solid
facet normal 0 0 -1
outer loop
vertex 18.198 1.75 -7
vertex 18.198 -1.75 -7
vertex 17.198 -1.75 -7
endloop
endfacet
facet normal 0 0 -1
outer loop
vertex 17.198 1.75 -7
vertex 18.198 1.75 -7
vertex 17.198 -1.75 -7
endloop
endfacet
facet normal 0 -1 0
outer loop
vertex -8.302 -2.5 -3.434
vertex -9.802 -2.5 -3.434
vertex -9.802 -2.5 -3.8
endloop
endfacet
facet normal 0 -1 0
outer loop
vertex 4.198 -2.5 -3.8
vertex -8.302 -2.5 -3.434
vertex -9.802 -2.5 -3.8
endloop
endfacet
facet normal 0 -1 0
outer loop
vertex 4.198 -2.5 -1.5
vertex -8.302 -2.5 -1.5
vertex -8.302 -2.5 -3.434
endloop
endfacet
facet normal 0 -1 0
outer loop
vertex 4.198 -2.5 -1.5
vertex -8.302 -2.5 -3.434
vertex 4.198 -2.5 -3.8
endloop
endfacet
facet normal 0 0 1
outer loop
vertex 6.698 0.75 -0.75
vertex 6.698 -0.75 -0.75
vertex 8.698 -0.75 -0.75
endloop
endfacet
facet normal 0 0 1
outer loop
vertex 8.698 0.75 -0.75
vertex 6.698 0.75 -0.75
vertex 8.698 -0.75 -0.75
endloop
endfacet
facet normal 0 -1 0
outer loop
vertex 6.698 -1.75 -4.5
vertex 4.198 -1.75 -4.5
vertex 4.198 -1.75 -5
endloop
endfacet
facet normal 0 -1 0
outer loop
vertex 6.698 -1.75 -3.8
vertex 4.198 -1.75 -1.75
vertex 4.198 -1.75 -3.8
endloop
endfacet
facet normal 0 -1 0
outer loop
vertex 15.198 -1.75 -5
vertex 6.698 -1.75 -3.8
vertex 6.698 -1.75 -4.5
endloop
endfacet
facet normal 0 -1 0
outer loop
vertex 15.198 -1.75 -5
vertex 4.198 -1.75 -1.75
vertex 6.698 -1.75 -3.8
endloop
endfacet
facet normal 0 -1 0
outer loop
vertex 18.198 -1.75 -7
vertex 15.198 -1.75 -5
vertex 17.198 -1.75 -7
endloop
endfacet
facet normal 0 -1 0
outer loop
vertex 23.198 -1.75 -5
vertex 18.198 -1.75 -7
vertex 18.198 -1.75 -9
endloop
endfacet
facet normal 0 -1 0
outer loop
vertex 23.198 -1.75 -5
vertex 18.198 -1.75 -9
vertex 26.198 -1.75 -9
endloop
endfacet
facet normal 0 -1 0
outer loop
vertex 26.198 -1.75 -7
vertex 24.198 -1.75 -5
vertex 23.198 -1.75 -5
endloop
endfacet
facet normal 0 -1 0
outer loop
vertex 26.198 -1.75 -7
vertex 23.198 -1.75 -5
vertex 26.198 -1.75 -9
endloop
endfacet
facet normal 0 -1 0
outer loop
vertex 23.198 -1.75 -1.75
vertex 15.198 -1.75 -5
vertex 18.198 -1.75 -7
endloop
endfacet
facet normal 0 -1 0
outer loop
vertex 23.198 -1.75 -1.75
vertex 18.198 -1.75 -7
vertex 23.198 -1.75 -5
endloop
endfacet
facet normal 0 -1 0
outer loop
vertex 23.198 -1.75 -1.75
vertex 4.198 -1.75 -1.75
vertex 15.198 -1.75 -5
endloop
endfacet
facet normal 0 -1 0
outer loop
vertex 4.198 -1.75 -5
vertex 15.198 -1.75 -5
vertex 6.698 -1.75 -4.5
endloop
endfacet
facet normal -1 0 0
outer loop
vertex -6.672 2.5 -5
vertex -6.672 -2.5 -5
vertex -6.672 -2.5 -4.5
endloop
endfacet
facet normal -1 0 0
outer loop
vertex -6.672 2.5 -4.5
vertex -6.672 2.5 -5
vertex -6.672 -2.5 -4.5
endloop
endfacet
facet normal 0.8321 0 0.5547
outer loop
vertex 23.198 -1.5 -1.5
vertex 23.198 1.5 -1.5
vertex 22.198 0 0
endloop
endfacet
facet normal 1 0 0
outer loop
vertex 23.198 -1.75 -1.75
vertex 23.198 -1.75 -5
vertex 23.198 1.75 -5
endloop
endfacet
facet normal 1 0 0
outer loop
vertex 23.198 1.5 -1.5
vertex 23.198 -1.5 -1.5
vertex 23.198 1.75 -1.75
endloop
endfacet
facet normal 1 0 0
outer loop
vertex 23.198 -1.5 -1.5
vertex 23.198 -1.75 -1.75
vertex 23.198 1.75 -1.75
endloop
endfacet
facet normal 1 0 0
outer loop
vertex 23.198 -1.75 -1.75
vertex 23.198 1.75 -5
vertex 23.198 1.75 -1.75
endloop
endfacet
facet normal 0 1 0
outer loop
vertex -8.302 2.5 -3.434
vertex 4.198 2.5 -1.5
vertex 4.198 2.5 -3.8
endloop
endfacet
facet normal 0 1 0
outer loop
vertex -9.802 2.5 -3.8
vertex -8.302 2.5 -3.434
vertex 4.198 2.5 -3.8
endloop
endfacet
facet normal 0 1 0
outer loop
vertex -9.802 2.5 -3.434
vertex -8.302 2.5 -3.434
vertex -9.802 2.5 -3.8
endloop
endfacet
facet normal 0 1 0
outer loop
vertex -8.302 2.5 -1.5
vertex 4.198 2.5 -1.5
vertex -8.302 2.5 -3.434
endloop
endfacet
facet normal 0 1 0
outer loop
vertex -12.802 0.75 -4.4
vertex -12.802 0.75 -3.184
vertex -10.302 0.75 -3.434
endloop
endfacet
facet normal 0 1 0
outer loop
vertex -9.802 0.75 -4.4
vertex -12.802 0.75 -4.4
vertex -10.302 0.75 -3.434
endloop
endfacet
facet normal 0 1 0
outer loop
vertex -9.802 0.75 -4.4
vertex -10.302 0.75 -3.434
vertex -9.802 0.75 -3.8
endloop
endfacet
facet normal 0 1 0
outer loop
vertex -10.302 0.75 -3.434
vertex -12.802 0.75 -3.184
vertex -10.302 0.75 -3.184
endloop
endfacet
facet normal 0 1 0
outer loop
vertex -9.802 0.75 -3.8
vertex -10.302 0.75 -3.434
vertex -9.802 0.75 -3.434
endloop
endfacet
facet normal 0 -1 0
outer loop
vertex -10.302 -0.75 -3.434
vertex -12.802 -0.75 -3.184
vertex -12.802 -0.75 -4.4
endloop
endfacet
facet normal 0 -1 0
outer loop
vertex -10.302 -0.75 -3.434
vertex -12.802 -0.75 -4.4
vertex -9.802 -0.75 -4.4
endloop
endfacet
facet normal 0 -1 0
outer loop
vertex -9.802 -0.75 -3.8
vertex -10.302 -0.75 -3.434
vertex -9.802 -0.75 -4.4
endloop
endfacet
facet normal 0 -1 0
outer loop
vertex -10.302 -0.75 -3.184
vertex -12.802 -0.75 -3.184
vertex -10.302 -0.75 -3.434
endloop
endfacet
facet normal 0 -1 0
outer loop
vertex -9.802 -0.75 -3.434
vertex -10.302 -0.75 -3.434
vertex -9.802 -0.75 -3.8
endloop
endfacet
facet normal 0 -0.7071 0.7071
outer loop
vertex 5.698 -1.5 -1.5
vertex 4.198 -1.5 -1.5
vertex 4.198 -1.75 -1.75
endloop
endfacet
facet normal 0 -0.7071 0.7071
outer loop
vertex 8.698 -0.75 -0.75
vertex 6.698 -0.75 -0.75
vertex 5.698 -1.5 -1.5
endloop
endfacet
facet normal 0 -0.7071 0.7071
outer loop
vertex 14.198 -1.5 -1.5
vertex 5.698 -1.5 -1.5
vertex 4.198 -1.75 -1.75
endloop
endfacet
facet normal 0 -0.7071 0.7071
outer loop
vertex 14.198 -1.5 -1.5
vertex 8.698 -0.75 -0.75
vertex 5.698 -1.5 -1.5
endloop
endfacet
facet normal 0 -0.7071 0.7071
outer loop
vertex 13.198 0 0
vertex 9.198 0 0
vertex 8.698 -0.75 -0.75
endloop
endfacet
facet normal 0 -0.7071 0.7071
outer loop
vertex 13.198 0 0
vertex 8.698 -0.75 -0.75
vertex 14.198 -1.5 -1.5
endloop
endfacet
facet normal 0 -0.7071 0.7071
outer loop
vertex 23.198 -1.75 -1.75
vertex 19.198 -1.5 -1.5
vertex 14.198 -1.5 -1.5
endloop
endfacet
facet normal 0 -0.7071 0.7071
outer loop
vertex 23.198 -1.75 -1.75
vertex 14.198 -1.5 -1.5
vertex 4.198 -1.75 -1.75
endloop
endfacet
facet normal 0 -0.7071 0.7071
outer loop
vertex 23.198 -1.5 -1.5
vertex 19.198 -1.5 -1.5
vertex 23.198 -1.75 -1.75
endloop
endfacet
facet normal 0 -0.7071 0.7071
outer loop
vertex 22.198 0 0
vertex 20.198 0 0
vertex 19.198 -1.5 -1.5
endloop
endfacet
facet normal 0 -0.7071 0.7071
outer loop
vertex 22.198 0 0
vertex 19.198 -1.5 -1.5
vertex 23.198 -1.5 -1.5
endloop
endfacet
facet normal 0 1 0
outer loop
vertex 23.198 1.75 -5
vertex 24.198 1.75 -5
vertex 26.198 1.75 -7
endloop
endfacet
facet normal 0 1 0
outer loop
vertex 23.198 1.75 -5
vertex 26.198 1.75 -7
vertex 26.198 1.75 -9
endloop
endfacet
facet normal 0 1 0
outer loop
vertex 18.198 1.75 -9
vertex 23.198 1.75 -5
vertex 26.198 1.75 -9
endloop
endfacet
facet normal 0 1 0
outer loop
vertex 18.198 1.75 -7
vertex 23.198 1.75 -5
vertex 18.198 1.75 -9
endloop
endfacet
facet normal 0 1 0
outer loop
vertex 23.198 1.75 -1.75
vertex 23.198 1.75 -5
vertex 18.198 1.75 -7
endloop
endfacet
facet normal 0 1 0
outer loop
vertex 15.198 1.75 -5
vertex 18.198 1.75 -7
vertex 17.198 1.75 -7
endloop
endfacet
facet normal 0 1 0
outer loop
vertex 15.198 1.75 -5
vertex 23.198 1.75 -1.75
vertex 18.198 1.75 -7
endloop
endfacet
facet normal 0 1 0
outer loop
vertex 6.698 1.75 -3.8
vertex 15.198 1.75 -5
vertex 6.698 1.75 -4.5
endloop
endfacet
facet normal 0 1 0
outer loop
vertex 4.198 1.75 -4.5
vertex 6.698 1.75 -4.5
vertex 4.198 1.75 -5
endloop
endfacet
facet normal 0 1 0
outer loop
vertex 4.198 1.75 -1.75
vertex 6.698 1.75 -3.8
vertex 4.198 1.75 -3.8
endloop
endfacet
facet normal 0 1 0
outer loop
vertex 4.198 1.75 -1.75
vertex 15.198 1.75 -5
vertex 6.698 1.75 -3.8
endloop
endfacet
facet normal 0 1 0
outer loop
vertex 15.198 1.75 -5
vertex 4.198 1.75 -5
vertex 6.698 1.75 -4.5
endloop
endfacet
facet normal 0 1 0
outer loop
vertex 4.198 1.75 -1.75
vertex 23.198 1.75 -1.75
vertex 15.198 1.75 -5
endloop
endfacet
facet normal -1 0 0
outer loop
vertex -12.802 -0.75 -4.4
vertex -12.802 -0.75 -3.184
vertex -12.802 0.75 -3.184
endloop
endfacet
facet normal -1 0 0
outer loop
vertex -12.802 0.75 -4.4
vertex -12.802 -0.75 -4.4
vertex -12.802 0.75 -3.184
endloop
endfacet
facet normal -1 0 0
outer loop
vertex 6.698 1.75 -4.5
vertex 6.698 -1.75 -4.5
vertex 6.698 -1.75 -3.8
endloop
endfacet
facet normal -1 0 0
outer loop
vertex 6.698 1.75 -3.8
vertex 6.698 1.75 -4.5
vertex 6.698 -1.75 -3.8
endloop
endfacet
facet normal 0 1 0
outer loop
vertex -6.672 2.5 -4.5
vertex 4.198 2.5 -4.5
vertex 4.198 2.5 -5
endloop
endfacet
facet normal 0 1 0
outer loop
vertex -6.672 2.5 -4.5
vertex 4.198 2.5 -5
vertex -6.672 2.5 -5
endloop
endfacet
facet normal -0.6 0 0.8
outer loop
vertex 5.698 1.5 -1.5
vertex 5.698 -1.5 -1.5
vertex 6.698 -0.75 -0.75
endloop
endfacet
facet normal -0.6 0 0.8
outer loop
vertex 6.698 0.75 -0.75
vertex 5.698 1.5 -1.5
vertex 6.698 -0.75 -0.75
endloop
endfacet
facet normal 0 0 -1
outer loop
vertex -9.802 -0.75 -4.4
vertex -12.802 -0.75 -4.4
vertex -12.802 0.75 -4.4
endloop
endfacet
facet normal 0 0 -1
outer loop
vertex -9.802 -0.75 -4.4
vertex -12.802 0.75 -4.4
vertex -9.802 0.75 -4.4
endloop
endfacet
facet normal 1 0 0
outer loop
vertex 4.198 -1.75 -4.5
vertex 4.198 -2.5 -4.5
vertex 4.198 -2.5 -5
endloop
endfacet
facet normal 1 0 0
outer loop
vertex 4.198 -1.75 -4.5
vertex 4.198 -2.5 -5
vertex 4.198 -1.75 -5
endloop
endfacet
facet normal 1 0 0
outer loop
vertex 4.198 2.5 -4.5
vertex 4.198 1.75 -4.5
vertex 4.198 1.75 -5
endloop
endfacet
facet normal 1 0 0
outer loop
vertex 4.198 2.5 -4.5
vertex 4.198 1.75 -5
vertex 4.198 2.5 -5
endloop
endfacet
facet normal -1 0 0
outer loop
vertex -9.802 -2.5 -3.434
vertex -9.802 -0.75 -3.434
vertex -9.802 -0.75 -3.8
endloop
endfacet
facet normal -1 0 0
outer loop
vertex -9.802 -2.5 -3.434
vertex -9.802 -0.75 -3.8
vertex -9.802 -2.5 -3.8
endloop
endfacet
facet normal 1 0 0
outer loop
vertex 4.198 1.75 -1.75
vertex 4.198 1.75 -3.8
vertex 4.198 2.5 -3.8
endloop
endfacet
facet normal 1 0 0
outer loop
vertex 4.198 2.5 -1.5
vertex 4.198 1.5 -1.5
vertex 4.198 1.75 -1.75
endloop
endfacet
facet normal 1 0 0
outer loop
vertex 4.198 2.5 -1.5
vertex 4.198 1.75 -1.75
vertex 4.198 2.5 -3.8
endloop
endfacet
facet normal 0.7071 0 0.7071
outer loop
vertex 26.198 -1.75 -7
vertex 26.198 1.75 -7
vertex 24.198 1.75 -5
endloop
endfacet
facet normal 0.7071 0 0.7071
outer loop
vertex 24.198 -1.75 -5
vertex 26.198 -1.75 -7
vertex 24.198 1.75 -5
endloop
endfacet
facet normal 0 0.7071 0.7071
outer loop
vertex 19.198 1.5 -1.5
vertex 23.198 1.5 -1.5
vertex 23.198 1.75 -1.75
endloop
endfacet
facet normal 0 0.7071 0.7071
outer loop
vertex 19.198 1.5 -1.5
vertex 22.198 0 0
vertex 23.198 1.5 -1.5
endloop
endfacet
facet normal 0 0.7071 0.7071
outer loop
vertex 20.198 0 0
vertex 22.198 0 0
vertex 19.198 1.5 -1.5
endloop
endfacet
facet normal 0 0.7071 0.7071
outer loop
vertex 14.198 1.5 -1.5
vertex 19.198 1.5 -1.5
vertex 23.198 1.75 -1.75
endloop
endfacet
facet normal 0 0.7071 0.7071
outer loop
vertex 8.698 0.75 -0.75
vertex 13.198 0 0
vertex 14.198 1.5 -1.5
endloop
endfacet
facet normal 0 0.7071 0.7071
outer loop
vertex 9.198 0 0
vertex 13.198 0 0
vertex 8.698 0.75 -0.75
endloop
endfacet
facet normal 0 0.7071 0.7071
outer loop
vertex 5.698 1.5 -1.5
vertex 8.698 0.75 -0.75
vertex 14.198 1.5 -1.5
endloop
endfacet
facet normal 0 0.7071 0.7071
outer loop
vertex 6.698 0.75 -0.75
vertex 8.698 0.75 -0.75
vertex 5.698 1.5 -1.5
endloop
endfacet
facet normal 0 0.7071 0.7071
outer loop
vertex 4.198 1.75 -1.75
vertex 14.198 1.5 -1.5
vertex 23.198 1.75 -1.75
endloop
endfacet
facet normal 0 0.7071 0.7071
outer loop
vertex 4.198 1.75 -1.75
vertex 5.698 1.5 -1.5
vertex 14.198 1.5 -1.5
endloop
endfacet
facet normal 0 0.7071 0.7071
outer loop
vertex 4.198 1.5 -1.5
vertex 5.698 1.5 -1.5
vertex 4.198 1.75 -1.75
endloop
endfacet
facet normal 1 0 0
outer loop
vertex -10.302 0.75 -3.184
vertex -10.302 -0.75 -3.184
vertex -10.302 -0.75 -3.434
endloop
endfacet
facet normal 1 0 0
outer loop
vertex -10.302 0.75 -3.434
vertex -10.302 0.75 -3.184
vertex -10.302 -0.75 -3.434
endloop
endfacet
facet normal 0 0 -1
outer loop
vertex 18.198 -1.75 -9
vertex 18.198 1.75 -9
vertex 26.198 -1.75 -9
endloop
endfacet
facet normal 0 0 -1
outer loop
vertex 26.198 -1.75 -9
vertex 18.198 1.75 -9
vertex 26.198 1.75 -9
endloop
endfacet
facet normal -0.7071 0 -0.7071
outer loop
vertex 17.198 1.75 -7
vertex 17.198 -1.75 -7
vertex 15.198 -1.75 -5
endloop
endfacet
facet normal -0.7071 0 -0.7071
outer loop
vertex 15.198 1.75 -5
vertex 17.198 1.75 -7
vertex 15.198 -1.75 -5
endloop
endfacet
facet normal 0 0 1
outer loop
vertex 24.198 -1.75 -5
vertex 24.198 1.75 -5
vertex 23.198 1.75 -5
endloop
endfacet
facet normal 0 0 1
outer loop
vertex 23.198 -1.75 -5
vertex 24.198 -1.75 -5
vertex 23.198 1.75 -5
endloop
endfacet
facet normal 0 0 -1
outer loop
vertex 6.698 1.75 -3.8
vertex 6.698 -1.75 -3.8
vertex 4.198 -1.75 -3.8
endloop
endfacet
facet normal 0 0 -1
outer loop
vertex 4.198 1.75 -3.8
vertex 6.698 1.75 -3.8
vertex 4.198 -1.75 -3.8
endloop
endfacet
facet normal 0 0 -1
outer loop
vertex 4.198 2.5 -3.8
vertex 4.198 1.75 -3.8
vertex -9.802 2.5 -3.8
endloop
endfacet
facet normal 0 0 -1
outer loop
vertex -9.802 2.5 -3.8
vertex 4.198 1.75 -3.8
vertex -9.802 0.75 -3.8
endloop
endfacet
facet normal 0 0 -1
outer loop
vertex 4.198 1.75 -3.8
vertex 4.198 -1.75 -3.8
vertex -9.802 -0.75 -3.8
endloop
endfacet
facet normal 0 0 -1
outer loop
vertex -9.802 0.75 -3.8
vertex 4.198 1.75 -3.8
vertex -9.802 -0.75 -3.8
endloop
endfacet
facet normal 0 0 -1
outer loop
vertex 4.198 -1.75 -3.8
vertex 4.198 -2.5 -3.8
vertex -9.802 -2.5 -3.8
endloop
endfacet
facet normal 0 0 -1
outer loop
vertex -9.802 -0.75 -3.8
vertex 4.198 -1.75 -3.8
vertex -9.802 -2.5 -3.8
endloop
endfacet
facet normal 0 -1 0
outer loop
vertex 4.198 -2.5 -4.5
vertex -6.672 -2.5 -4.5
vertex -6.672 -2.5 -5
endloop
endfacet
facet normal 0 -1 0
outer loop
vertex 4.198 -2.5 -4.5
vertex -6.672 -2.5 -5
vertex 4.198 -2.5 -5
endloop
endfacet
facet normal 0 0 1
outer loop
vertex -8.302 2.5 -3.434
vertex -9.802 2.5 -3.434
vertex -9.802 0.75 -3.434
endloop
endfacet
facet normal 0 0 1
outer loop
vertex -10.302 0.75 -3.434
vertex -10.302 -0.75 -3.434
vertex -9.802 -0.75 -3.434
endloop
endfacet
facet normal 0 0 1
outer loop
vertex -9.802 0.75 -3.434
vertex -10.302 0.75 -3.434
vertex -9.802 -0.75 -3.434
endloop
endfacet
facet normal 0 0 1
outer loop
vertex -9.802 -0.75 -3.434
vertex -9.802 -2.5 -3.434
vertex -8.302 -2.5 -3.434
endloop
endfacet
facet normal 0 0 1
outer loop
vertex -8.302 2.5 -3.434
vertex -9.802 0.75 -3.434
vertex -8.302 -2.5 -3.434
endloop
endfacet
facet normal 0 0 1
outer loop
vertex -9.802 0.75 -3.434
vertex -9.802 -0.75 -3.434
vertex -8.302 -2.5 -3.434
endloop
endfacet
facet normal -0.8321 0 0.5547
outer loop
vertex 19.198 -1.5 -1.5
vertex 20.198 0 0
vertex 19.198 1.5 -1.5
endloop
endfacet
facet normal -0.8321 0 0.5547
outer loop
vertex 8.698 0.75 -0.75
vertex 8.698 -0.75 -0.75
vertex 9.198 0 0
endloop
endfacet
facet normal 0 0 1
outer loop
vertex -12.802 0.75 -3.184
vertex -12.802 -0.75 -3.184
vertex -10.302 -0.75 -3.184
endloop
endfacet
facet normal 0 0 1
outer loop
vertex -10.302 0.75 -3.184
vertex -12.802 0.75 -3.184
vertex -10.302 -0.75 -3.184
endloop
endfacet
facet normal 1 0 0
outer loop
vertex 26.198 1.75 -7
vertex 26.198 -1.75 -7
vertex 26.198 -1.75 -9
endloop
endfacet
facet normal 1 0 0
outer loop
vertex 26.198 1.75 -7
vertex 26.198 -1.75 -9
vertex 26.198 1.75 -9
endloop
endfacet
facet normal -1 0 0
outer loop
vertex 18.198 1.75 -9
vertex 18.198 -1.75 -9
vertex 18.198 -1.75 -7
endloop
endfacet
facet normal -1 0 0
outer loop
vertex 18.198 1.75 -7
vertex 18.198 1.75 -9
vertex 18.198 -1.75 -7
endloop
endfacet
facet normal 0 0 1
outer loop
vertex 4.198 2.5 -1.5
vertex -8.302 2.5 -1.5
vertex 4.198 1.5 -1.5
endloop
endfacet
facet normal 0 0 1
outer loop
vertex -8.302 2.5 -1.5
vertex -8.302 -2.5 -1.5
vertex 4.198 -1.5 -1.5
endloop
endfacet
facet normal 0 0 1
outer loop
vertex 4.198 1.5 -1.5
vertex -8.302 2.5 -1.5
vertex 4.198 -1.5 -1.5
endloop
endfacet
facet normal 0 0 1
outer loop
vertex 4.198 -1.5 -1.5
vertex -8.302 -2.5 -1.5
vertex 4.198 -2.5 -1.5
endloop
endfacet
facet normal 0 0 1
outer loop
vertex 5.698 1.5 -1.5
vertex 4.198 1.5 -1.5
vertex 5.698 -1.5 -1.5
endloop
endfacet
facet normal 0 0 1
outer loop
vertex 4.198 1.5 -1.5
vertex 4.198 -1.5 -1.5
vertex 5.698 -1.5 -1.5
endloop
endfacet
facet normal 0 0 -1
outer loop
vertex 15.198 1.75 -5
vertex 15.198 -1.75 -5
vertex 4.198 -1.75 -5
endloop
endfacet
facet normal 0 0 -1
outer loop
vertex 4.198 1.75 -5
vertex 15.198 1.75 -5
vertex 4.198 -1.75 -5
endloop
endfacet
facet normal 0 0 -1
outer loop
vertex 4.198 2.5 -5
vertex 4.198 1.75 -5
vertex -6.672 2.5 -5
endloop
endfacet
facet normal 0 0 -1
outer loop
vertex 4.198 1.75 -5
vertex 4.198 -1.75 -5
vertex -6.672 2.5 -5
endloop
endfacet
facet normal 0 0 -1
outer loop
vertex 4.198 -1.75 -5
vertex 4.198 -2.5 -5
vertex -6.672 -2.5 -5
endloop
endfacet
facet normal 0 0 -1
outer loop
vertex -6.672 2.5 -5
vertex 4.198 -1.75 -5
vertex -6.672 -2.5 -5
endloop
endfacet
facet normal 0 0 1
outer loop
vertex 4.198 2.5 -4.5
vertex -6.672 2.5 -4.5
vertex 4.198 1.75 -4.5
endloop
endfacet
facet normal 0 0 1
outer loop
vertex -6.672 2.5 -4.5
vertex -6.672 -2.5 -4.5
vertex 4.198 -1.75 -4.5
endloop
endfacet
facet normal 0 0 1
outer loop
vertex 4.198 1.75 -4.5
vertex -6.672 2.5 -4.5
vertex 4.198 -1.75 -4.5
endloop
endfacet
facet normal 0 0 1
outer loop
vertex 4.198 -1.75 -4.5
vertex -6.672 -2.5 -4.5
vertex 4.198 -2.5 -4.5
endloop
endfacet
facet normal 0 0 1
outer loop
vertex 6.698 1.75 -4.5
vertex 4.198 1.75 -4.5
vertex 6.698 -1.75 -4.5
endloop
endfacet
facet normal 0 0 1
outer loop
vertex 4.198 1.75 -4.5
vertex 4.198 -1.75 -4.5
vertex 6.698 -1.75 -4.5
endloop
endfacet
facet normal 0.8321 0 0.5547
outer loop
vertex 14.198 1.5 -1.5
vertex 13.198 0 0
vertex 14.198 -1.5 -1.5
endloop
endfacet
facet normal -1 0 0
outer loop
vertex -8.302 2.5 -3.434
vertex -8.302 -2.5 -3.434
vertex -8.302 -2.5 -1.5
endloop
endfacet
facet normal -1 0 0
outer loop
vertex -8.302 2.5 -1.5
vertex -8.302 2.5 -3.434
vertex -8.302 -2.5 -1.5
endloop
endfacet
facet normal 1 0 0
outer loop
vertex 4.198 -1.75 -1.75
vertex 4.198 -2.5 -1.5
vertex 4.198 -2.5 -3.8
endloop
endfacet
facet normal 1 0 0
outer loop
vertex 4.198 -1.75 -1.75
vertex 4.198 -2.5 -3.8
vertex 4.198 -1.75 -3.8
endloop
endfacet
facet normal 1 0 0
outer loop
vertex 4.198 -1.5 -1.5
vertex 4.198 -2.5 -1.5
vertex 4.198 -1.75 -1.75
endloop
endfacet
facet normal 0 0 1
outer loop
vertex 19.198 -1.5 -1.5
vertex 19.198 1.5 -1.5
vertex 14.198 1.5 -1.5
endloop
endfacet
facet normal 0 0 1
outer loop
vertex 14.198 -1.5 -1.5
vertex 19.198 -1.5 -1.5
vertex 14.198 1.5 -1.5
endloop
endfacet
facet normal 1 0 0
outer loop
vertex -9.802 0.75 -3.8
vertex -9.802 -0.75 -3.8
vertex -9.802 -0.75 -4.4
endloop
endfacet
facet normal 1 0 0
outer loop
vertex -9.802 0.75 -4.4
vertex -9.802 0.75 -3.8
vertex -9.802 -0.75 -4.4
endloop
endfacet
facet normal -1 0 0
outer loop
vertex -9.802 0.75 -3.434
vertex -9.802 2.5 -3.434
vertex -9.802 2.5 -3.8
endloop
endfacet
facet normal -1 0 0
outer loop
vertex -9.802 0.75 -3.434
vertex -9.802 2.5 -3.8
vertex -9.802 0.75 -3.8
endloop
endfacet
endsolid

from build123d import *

# Parameters (mm, degrees)
F0_W      = 3
F0_H      = 1.5
F0_W_2    = 2
F0_H_2    = 3.5
F0_W_3    = 1
F0_W_4    = 8
F1_DEPTH  = 9
F5_DEPTH  = 25
F7_DEPTH  = 25
F9_DEPTH  = 25
F10_W     = 3
F10_H     = 0.6
F11_DEPTH = 25
F12_SIZE2 = 1.75
F12_SIZE  = 1.75
F13_SIZE2 = 1.74999
F13_SIZE  = 1.74999


# Not quite as in the source:
# - a fillet or chamfer is up to 0.001 mm smaller than in the source, because OpenCascade refuses the exact size


with BuildPart() as f1:
    # F0 (on Top) → F1 (new body)
    with BuildSketch(Plane.XY):
        Polygon((4.1984589845, 2.5), (-9.8015410155, 2.5), (-9.8015410155, 0.75), (-9.8015410155, -0.75), (-9.8015410155, -2.5), (4.1984589845, -2.5), (4.1984589845, -1.75), (15.1984589845, -1.75), (15.1984589845, 1.75), (4.1984589845, 1.75), align=None)
        with Locations((-11.3015410155, 0)):
            Rectangle(F0_W, F0_H)
        with Locations((16.1984589845, 0)):
            Rectangle(F0_W_2, F0_H_2)
        with Locations((17.6984589845, 0)):
            Rectangle(F0_W_3, F0_H_2)
        with Locations((22.1984589845, 0)):
            Rectangle(F0_W_4, F0_H_2)
    extrude(amount=-F1_DEPTH)

    # F4 (on offset) → F5 (cut)
    with BuildSketch(Plane(origin=(0, 2.5, 0), x_dir=(-1, 0, 0), z_dir=(0, 1, 0))):
        Polygon((-26.1984589845, -7), (-24.1984589845, -5), (-23.1984589845, -5), (-23.1984589845, -1.5), (-22.1984589845, 0), (-26.1984589845, 0), align=None)
        Polygon((-18.1984589845, 0), (-20.1984589845, 0), (-19.1984589845, -1.5), (-18.1984589845, -1.5), align=None)
    extrude(amount=-F5_DEPTH, mode=Mode.SUBTRACT)

    # F6 (on face) → F7 (cut)
    with BuildSketch(Plane.XZ.offset(1.75)):
        Polygon((4.1984589845, -9), (18.1984589845, -9), (18.1984589845, -7), (17.1984589845, -7), (15.1984589845, -5), (4.1984589845, -5), align=None)
        Polygon((8.6984589845, -0.75), (9.1984589845, 0), (4.1984589845, 0), (4.1984589845, -1.5), (5.6984589845, -1.5), (6.6984589845, -0.75), align=None)
        Polygon((15.1984589845, -1.5), (18.1984589845, -1.5), (18.1984589845, 0), (13.1984589845, 0), (14.1984589845, -1.5), align=None)
    extrude(amount=-F7_DEPTH, mode=Mode.SUBTRACT)

    # F8 (on face) → F9 (cut)
    with BuildSketch(Plane.XZ.offset(2.5)):
        Polygon((-12.8015410155, -9), (4.1984589845, -9), (4.1984589845, -5), (-10.3015410155, -5), (-12.8015410155, -5), align=None)
        Polygon((4.1984589845, -1.5), (4.1984589845, 0), (-12.8015410155, 0), (-12.8015410155, -3.1837357674), (-10.3015410155, -3.1837357674), (-10.3015410155, -3.4337357674), (-8.3015410155, -3.4337357674), (-8.3015410155, -1.5), align=None)
    extrude(amount=-F9_DEPTH, mode=Mode.SUBTRACT)

    # F10 (on face) → F11 (cut)
    with BuildSketch(Plane.XZ.offset(2.5)):
        Polygon((-9.8015410155, -5), (-6.6717453301, -5), (-6.6717453301, -4.5), (6.6984589845, -4.5), (6.6984589845, -3.8), (-9.8015410155, -3.8), (-9.8015410155, -4.4), align=None)
        with Locations((-11.3015410155, -4.7)):
            Rectangle(F10_W, F10_H)
    extrude(amount=-F11_DEPTH, mode=Mode.SUBTRACT)

    # F12
    f12_edges = [f1.edges().sort_by_distance(p)[0] for p in [
        (21.198459, -1.75, 0),
    ]]
    chamfer(f12_edges, length=F12_SIZE, length2=F12_SIZE2)

    # F13 (size 1.75 and 1.75 in the source; OpenCascade refuses exactly that, so slightly less here)
    f13_edges = [f1.edges().sort_by_distance(p)[0] for p in [
        (21.198459, 1.75, 0),
    ]]
    chamfer(f13_edges, length=F13_SIZE, length2=F13_SIZE2)


solid = f1.part
